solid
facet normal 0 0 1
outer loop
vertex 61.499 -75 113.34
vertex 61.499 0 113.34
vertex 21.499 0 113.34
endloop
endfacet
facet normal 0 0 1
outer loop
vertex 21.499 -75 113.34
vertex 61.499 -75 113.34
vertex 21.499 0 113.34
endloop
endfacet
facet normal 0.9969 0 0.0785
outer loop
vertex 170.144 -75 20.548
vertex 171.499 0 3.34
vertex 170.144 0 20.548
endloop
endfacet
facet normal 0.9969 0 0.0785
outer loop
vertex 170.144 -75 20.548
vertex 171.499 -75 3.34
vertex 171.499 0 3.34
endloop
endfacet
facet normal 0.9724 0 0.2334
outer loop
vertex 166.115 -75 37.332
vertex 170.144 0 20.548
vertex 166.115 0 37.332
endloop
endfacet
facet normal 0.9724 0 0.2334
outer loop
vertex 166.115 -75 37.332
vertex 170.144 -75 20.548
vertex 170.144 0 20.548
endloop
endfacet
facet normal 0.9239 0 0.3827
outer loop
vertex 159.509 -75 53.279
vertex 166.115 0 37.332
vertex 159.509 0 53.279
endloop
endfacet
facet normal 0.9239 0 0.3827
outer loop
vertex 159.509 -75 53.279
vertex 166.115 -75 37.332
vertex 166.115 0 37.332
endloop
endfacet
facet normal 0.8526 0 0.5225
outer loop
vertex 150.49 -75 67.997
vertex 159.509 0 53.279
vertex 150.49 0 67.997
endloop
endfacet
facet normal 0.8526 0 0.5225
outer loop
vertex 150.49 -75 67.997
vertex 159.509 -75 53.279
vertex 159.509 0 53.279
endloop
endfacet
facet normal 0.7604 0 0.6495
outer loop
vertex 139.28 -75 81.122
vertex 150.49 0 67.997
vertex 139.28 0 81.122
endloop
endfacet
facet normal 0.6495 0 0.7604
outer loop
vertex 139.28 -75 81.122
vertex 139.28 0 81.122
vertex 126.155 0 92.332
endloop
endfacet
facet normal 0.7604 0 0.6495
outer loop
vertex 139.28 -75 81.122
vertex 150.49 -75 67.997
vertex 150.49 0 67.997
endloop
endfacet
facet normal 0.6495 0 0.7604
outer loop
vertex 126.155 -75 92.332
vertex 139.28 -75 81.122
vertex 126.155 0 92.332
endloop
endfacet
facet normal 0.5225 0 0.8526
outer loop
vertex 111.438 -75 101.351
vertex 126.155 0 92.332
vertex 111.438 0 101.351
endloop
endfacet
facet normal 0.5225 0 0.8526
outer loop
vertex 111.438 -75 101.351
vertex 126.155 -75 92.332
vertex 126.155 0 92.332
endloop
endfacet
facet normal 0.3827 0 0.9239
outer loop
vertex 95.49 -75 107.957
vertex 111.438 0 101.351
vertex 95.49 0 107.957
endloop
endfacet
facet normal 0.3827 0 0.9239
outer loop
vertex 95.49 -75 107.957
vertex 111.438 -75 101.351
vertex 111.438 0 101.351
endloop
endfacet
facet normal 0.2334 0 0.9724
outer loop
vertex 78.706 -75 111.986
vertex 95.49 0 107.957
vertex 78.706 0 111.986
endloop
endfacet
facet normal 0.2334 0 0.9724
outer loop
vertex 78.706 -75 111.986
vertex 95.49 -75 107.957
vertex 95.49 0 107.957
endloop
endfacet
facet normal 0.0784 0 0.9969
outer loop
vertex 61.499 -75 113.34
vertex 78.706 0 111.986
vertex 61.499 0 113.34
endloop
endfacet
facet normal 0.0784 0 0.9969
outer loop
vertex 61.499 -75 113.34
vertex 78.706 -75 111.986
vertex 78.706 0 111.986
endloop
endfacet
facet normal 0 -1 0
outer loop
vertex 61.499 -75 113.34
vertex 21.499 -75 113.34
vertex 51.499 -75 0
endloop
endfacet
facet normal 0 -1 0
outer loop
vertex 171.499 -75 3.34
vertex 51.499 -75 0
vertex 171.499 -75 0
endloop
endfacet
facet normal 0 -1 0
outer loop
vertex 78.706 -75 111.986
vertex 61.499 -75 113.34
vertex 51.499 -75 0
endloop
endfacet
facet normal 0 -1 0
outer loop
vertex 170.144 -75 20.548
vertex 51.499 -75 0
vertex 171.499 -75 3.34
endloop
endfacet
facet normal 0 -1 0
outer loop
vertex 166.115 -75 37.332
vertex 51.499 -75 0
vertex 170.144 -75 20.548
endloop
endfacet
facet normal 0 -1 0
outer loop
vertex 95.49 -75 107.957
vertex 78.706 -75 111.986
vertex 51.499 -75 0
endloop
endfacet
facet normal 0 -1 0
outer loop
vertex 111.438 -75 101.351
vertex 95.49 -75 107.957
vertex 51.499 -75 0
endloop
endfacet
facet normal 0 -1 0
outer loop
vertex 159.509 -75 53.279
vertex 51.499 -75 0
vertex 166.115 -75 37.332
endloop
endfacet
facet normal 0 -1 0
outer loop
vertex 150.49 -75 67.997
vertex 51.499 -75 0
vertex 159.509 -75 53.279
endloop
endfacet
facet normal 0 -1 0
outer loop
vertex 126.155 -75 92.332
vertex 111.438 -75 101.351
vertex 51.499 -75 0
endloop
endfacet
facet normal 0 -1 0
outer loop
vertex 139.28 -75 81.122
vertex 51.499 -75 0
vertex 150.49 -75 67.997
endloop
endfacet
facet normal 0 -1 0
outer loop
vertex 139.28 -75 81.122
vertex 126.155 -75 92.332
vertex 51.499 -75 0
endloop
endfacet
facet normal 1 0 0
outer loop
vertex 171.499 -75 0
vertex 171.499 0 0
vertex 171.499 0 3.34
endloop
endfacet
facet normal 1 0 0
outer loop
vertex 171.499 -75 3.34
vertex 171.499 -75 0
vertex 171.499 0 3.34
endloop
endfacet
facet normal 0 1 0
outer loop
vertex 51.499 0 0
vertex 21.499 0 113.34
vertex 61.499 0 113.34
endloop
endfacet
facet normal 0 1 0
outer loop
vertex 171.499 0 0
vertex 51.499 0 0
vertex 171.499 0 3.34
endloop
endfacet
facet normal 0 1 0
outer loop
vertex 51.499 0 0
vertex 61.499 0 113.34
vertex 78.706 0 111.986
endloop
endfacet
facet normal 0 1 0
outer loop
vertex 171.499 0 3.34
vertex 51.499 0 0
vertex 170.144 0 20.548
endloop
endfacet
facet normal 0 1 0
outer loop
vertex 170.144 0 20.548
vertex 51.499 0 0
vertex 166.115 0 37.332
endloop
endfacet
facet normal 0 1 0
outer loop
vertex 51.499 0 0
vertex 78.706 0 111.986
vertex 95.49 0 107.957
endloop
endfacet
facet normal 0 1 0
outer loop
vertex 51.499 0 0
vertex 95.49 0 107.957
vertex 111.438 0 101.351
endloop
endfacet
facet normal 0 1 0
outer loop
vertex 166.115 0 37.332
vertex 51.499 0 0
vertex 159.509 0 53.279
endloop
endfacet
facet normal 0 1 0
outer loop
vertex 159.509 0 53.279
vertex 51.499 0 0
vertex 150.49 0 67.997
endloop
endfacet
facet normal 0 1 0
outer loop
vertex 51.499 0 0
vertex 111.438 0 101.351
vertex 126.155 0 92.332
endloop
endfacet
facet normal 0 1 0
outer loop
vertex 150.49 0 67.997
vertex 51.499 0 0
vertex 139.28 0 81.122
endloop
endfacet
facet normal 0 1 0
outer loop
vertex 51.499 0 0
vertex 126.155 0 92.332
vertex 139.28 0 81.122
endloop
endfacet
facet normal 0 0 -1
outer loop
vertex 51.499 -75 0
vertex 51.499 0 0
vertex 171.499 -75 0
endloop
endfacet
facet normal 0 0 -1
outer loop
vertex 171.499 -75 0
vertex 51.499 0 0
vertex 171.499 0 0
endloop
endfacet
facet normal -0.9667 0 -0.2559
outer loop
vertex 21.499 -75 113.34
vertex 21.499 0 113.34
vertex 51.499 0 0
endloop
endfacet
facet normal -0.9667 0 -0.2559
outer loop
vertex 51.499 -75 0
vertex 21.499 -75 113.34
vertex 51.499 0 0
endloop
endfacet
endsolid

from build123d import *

# Parameters (mm, degrees)
F1_DEPTH = 75
F2_R     = 110


with BuildPart() as f1:
    # F0 (on Front) → F1 (new body)
    with BuildSketch(Plane.XZ):
        Polygon((21.498629, 113.340293), (51.498629, 0), (171.498629, 0), (171.498629, 113.340293), align=None)
    extrude(amount=F1_DEPTH)

    # F2
    f2_edges = [f1.edges().sort_by_distance(p)[0] for p in [
        (171.498629, -37.5, 113.340293),
    ]]
    fillet(f2_edges, radius=F2_R)


solid = f1.part
